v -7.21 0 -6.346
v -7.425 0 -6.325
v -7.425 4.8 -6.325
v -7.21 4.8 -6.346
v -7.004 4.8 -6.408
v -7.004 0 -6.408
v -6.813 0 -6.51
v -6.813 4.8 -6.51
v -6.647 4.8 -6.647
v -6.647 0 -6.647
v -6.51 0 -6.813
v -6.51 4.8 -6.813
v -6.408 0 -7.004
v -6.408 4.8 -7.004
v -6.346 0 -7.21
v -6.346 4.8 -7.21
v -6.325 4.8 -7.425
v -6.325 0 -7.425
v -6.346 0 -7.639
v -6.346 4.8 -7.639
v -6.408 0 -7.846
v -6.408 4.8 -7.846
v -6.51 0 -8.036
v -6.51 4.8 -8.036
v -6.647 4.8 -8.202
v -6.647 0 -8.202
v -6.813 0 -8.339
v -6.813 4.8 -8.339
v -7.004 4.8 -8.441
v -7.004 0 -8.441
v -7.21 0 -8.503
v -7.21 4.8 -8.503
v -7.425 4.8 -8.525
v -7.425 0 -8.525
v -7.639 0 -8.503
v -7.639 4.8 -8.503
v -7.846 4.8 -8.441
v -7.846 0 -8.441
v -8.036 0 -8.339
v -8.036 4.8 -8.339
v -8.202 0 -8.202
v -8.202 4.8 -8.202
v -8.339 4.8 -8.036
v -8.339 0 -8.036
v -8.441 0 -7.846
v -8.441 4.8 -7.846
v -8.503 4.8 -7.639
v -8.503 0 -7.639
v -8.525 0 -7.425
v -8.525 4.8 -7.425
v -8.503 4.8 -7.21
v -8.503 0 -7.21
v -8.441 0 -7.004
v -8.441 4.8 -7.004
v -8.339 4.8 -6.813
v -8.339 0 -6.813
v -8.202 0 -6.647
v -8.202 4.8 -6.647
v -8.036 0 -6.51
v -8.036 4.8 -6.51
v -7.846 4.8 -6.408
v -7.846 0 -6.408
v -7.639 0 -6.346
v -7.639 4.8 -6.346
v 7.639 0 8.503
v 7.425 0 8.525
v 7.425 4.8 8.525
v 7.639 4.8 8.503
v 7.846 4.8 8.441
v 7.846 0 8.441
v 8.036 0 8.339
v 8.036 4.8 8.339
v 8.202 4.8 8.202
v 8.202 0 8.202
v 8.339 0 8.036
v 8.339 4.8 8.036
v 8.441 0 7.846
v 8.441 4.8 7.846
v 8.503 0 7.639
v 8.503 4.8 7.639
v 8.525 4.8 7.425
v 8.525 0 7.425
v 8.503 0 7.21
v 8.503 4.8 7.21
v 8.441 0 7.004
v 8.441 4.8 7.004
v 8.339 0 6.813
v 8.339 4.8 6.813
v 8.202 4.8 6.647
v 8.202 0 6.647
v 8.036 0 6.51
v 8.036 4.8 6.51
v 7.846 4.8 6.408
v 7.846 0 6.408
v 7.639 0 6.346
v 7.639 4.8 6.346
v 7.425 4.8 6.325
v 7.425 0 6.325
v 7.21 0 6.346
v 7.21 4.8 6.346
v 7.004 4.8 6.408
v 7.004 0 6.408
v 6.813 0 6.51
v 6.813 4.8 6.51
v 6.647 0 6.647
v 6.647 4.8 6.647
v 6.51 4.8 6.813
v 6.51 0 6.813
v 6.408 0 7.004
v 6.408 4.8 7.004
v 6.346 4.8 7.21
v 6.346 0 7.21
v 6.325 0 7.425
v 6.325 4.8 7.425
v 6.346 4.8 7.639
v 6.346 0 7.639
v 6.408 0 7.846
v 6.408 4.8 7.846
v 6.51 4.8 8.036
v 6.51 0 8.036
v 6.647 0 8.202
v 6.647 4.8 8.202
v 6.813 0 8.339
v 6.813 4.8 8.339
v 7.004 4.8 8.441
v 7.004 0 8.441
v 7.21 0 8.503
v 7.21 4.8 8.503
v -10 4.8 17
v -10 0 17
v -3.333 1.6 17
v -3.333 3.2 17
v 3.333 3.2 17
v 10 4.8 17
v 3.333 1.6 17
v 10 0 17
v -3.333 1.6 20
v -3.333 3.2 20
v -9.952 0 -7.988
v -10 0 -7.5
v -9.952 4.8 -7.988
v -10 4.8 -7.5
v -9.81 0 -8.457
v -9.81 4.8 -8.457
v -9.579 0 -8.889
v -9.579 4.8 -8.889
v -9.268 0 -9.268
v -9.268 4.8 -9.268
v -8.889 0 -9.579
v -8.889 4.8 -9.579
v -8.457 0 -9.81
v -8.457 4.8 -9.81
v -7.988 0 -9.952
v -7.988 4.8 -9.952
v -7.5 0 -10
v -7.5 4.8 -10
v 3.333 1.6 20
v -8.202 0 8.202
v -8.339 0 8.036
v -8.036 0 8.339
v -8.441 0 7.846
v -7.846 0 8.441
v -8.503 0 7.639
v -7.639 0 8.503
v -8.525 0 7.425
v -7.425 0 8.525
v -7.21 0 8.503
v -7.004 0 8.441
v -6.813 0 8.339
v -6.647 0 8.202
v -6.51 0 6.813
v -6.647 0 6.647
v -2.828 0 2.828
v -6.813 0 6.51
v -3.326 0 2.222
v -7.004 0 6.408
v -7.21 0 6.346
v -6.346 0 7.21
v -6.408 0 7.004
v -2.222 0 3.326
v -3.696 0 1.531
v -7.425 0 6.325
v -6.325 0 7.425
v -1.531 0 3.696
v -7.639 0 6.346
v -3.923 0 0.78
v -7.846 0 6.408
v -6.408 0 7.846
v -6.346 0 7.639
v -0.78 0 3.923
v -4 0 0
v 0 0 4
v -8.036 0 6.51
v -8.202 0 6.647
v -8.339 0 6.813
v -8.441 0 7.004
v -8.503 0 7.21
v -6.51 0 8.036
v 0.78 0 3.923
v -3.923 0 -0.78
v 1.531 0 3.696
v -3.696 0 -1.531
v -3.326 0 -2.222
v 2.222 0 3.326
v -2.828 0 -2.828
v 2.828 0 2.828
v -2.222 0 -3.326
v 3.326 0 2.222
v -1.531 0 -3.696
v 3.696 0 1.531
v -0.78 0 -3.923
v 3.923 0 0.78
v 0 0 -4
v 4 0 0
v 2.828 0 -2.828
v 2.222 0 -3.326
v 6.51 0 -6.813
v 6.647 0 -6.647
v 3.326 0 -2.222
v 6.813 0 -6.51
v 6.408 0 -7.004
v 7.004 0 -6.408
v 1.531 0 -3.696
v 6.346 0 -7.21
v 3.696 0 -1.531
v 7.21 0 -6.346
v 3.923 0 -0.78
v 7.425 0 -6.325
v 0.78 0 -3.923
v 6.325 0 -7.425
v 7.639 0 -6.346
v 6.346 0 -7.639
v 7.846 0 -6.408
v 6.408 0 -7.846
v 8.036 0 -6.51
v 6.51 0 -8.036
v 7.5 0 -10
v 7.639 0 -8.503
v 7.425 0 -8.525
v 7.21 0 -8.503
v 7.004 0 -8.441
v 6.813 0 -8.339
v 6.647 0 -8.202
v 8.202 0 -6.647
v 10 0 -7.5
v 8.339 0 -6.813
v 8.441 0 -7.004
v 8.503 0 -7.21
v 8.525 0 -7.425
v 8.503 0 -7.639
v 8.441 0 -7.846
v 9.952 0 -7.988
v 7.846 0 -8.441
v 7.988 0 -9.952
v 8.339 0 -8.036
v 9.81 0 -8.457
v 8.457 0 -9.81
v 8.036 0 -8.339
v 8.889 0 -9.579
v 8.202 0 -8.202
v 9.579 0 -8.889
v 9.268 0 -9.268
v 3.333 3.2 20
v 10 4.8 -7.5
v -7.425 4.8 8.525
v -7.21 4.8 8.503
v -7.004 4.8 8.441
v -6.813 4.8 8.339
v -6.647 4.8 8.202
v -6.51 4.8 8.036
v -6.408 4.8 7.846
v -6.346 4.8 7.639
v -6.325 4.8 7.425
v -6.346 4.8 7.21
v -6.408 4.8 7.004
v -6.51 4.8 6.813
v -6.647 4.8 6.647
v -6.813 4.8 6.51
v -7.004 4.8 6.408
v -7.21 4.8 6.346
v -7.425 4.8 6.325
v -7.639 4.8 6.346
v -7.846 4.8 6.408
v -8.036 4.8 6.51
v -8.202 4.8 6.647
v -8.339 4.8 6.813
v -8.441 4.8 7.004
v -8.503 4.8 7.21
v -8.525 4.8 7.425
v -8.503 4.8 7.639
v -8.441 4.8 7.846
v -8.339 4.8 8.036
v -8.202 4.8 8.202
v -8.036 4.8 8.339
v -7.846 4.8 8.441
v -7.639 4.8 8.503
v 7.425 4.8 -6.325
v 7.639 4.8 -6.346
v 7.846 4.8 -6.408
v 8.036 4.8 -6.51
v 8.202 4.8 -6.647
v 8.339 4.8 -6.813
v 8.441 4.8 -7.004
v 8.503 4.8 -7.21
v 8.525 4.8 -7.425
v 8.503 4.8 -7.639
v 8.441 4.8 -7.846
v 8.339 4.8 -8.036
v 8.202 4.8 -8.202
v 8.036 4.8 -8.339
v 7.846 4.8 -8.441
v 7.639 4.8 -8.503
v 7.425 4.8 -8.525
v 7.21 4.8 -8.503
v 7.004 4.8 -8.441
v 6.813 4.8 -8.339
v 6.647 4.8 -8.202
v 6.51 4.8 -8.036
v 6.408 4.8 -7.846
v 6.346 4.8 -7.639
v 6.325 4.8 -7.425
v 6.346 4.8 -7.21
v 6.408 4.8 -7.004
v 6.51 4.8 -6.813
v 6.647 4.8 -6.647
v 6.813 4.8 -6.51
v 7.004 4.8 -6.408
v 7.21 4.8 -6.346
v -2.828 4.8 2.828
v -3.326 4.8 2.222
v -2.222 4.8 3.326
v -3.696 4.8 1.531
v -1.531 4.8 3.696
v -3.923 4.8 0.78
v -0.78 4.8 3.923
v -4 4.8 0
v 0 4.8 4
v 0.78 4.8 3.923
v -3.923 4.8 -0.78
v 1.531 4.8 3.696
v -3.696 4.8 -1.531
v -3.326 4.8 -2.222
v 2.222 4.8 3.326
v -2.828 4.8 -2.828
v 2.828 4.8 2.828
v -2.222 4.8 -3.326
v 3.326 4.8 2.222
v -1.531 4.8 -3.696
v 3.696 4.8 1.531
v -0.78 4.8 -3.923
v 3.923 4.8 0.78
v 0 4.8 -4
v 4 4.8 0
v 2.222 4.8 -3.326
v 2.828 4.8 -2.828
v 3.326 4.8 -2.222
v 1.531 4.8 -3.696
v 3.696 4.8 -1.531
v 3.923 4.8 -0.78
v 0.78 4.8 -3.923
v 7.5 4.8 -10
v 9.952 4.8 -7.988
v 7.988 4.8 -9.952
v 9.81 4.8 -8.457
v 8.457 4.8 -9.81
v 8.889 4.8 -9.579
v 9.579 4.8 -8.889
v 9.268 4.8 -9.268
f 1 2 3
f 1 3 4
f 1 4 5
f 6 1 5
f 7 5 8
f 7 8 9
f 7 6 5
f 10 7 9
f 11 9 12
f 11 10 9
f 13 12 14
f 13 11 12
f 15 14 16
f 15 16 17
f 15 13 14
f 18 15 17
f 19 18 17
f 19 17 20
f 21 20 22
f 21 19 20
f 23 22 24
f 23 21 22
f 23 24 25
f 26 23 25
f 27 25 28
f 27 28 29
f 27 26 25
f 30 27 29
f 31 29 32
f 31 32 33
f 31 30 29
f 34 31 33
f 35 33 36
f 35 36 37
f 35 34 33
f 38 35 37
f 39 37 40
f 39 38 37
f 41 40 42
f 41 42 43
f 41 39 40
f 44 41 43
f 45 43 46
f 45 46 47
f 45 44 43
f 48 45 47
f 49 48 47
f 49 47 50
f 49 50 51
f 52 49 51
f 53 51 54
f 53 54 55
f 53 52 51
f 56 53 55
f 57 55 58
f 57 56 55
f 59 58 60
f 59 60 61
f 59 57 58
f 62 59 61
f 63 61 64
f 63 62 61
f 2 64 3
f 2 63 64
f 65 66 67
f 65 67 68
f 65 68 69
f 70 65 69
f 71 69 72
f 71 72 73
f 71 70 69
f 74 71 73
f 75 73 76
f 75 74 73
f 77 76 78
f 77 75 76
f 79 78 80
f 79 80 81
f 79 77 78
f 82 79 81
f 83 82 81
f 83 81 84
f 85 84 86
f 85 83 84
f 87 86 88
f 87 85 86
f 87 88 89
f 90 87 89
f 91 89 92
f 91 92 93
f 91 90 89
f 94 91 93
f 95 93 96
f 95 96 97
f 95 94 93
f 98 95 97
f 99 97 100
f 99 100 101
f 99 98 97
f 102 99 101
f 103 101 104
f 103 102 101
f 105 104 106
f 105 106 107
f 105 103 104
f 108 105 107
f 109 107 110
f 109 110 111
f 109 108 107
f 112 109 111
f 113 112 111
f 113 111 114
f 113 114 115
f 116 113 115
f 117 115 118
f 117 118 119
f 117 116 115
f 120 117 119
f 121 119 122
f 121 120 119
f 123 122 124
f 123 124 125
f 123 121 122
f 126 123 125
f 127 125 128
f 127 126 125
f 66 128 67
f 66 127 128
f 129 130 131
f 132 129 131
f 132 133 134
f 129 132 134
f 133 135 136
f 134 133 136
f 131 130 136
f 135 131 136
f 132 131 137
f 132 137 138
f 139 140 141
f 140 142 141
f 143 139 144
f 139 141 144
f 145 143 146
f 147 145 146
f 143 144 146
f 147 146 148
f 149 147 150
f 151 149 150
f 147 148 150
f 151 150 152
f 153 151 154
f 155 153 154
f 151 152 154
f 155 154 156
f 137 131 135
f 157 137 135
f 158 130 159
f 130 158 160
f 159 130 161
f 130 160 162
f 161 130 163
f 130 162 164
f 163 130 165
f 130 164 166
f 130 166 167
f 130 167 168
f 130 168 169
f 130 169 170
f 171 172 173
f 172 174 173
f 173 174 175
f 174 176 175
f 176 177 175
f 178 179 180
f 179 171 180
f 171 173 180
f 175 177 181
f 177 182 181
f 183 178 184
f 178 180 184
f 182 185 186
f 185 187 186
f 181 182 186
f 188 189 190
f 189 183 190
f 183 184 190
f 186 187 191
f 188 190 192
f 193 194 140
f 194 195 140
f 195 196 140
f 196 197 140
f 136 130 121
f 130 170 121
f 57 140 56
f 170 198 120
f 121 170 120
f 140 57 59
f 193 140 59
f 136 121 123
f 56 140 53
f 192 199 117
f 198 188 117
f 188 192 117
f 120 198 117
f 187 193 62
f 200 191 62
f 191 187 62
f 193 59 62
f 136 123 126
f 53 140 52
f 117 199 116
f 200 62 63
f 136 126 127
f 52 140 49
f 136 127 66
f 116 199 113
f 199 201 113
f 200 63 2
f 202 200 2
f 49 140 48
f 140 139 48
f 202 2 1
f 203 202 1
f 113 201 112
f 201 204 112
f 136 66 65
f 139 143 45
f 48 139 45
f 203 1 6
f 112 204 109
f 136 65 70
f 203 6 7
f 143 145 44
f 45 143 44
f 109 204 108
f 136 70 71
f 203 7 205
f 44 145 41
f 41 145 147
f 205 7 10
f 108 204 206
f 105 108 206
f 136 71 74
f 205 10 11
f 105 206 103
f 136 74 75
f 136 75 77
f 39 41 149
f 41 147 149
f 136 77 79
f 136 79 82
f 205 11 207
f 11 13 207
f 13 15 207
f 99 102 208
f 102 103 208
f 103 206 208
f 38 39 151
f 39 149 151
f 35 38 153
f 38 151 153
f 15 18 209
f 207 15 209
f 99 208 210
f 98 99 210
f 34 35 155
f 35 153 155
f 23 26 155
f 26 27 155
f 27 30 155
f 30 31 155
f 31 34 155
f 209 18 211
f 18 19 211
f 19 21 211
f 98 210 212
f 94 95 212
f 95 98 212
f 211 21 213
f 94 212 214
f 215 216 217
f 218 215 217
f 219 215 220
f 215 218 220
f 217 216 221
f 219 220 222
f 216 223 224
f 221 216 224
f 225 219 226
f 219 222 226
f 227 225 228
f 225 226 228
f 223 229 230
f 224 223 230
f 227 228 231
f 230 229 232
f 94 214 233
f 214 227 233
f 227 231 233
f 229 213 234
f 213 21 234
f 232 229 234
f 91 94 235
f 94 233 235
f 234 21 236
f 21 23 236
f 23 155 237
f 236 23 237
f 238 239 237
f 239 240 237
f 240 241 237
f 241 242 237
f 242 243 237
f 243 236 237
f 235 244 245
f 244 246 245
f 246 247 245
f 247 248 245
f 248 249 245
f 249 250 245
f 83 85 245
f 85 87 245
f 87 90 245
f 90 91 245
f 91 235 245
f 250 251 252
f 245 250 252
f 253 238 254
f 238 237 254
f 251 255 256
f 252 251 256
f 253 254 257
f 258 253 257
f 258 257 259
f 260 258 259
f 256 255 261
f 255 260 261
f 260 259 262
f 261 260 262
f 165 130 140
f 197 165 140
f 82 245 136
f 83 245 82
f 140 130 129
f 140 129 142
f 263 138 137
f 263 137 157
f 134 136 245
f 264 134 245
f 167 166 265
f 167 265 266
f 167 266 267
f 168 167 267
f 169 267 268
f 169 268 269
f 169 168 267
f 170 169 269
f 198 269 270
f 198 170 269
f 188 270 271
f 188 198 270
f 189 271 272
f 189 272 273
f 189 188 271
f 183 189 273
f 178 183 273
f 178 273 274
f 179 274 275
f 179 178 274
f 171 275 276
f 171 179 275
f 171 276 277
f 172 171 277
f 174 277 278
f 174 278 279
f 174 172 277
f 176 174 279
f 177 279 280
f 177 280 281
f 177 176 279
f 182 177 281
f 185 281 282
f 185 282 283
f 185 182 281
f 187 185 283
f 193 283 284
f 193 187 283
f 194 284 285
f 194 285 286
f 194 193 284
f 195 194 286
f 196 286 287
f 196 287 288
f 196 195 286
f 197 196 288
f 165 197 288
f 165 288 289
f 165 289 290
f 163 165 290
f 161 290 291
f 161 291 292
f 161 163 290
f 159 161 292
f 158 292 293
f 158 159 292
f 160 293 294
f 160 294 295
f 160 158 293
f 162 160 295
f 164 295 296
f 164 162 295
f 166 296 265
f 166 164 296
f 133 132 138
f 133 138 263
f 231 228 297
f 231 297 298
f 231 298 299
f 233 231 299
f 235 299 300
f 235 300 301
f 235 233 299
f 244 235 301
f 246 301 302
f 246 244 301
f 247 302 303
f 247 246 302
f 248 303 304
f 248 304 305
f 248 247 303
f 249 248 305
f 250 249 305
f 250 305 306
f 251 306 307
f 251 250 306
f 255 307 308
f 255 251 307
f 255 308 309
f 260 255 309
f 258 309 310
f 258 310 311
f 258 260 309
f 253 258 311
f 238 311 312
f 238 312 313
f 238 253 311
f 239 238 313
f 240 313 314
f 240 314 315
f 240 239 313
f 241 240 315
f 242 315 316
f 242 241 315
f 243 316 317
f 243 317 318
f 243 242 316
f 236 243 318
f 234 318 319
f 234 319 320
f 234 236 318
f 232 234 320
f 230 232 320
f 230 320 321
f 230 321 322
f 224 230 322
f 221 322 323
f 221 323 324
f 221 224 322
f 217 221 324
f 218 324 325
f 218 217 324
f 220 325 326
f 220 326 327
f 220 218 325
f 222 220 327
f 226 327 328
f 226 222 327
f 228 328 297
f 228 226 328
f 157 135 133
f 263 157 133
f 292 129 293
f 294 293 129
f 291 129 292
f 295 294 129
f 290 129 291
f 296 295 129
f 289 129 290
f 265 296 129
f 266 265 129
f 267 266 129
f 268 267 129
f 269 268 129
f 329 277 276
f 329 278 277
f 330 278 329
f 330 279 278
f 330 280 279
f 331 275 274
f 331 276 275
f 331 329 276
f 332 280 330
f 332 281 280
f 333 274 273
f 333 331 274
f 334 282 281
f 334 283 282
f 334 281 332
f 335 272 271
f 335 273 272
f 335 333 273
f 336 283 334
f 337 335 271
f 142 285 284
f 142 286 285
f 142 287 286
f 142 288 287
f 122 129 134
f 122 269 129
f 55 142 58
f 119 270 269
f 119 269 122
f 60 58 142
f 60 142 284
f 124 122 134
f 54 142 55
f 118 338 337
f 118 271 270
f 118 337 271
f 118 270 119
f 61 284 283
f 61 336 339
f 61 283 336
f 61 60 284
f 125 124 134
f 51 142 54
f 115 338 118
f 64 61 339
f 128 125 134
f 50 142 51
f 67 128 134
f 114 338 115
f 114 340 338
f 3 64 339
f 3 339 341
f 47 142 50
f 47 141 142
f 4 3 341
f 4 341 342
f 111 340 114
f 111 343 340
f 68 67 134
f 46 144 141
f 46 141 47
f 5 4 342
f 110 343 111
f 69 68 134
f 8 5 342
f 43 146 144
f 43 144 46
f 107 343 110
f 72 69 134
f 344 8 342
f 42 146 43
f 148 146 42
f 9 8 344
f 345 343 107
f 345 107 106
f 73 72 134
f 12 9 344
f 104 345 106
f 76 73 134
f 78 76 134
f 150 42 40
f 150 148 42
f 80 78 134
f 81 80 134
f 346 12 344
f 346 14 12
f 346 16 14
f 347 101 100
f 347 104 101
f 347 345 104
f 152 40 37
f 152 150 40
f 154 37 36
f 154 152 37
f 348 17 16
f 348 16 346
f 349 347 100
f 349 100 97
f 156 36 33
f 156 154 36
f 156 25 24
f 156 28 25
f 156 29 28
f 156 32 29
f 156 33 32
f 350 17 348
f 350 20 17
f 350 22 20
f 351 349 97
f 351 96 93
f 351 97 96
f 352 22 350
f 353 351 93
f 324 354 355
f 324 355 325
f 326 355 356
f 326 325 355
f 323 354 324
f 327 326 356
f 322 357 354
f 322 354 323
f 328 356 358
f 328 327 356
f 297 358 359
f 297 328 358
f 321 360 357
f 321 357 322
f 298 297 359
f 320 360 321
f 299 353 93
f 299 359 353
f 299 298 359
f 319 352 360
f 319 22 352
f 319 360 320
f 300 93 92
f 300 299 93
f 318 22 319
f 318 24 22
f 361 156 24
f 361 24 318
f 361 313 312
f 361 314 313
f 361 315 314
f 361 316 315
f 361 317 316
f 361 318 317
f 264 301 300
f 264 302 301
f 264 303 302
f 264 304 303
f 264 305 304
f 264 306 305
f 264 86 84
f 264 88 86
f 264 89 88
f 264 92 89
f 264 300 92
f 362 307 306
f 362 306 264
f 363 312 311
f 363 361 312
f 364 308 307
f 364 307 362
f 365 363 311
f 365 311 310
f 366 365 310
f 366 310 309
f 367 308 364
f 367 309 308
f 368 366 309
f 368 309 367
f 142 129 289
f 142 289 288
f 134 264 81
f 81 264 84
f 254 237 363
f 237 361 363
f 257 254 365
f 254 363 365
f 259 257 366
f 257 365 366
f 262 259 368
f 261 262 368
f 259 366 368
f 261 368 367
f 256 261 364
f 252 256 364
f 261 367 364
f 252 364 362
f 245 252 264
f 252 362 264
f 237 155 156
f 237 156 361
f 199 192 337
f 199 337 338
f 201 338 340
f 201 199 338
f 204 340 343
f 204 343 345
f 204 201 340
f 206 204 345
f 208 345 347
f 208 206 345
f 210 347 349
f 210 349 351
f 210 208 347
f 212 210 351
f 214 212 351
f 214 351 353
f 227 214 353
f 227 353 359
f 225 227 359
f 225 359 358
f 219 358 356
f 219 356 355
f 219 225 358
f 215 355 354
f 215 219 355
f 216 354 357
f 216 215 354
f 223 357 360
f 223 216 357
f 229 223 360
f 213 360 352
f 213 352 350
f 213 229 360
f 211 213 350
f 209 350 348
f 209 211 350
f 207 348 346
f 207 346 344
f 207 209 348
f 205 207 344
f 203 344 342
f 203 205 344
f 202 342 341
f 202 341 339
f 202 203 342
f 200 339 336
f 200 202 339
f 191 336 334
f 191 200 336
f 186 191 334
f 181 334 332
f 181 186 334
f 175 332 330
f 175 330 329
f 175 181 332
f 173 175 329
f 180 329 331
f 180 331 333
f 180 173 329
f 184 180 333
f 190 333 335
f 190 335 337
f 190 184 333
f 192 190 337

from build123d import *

# Parameters (mm, degrees)
SKETCH_1_W      = 20
SKETCH_1_H      = 27
SKETCH_1_R      = 1.1
SKETCH_1_R_2    = 4
EXTRUDE_1_DEPTH = 4.8
FILLET_3_R      = 2.5
FILLET_4_R      = 2.5
SKETCH_2_W      = 6.666666666
SKETCH_2_H      = 1.6
EXTRUDE_2_DEPTH = 3


with BuildPart() as part:
    # 草图1 → 凸台-拉伸1 (new body)
    with BuildSketch(Plane(origin=(0, 0, 0), x_dir=(1, 0, 0), z_dir=(0, 1, 0))):
        with Locations((0, -3.5)):
            Rectangle(SKETCH_1_W, SKETCH_1_H)
        with Locations(Location((7.424621202, 7.424621202, 0), (0, 0, 270))):
            Circle(SKETCH_1_R, mode=Mode.SUBTRACT)
        with Locations(Location((7.424621202, -7.424621202, 0), (0, 0, 270))):
            Circle(SKETCH_1_R, mode=Mode.SUBTRACT)
        with Locations(Location((-7.424621202, -7.424621202, 0), (0, 0, 270))):
            Circle(SKETCH_1_R, mode=Mode.SUBTRACT)
        with Locations(Location((-7.424621202, 7.424621202, 0), (0, 0, 270))):
            Circle(SKETCH_1_R, mode=Mode.SUBTRACT)
        with Locations(Location((0, 0, 0), (0, 0, 270))):
            Circle(SKETCH_1_R_2, mode=Mode.SUBTRACT)
    extrude(amount=EXTRUDE_1_DEPTH)

    # 圆角3
    fillet_3_edges = [part.edges().sort_by_distance(p)[0] for p in [
        (-10, 2.4, -10),
    ]]
    fillet(fillet_3_edges, radius=FILLET_3_R)

    # 圆角4
    fillet_4_edges = [part.edges().sort_by_distance(p)[0] for p in [
        (10, 2.4, -10),
    ]]
    fillet(fillet_4_edges, radius=FILLET_4_R)

    # 草图2 → 凸台-拉伸2 (add)
    with BuildSketch(Plane.XY.offset(17)):
        with Locations((0, 2.4)):
            Rectangle(SKETCH_2_W, SKETCH_2_H)
    extrude(amount=EXTRUDE_2_DEPTH)


solid = part.part
